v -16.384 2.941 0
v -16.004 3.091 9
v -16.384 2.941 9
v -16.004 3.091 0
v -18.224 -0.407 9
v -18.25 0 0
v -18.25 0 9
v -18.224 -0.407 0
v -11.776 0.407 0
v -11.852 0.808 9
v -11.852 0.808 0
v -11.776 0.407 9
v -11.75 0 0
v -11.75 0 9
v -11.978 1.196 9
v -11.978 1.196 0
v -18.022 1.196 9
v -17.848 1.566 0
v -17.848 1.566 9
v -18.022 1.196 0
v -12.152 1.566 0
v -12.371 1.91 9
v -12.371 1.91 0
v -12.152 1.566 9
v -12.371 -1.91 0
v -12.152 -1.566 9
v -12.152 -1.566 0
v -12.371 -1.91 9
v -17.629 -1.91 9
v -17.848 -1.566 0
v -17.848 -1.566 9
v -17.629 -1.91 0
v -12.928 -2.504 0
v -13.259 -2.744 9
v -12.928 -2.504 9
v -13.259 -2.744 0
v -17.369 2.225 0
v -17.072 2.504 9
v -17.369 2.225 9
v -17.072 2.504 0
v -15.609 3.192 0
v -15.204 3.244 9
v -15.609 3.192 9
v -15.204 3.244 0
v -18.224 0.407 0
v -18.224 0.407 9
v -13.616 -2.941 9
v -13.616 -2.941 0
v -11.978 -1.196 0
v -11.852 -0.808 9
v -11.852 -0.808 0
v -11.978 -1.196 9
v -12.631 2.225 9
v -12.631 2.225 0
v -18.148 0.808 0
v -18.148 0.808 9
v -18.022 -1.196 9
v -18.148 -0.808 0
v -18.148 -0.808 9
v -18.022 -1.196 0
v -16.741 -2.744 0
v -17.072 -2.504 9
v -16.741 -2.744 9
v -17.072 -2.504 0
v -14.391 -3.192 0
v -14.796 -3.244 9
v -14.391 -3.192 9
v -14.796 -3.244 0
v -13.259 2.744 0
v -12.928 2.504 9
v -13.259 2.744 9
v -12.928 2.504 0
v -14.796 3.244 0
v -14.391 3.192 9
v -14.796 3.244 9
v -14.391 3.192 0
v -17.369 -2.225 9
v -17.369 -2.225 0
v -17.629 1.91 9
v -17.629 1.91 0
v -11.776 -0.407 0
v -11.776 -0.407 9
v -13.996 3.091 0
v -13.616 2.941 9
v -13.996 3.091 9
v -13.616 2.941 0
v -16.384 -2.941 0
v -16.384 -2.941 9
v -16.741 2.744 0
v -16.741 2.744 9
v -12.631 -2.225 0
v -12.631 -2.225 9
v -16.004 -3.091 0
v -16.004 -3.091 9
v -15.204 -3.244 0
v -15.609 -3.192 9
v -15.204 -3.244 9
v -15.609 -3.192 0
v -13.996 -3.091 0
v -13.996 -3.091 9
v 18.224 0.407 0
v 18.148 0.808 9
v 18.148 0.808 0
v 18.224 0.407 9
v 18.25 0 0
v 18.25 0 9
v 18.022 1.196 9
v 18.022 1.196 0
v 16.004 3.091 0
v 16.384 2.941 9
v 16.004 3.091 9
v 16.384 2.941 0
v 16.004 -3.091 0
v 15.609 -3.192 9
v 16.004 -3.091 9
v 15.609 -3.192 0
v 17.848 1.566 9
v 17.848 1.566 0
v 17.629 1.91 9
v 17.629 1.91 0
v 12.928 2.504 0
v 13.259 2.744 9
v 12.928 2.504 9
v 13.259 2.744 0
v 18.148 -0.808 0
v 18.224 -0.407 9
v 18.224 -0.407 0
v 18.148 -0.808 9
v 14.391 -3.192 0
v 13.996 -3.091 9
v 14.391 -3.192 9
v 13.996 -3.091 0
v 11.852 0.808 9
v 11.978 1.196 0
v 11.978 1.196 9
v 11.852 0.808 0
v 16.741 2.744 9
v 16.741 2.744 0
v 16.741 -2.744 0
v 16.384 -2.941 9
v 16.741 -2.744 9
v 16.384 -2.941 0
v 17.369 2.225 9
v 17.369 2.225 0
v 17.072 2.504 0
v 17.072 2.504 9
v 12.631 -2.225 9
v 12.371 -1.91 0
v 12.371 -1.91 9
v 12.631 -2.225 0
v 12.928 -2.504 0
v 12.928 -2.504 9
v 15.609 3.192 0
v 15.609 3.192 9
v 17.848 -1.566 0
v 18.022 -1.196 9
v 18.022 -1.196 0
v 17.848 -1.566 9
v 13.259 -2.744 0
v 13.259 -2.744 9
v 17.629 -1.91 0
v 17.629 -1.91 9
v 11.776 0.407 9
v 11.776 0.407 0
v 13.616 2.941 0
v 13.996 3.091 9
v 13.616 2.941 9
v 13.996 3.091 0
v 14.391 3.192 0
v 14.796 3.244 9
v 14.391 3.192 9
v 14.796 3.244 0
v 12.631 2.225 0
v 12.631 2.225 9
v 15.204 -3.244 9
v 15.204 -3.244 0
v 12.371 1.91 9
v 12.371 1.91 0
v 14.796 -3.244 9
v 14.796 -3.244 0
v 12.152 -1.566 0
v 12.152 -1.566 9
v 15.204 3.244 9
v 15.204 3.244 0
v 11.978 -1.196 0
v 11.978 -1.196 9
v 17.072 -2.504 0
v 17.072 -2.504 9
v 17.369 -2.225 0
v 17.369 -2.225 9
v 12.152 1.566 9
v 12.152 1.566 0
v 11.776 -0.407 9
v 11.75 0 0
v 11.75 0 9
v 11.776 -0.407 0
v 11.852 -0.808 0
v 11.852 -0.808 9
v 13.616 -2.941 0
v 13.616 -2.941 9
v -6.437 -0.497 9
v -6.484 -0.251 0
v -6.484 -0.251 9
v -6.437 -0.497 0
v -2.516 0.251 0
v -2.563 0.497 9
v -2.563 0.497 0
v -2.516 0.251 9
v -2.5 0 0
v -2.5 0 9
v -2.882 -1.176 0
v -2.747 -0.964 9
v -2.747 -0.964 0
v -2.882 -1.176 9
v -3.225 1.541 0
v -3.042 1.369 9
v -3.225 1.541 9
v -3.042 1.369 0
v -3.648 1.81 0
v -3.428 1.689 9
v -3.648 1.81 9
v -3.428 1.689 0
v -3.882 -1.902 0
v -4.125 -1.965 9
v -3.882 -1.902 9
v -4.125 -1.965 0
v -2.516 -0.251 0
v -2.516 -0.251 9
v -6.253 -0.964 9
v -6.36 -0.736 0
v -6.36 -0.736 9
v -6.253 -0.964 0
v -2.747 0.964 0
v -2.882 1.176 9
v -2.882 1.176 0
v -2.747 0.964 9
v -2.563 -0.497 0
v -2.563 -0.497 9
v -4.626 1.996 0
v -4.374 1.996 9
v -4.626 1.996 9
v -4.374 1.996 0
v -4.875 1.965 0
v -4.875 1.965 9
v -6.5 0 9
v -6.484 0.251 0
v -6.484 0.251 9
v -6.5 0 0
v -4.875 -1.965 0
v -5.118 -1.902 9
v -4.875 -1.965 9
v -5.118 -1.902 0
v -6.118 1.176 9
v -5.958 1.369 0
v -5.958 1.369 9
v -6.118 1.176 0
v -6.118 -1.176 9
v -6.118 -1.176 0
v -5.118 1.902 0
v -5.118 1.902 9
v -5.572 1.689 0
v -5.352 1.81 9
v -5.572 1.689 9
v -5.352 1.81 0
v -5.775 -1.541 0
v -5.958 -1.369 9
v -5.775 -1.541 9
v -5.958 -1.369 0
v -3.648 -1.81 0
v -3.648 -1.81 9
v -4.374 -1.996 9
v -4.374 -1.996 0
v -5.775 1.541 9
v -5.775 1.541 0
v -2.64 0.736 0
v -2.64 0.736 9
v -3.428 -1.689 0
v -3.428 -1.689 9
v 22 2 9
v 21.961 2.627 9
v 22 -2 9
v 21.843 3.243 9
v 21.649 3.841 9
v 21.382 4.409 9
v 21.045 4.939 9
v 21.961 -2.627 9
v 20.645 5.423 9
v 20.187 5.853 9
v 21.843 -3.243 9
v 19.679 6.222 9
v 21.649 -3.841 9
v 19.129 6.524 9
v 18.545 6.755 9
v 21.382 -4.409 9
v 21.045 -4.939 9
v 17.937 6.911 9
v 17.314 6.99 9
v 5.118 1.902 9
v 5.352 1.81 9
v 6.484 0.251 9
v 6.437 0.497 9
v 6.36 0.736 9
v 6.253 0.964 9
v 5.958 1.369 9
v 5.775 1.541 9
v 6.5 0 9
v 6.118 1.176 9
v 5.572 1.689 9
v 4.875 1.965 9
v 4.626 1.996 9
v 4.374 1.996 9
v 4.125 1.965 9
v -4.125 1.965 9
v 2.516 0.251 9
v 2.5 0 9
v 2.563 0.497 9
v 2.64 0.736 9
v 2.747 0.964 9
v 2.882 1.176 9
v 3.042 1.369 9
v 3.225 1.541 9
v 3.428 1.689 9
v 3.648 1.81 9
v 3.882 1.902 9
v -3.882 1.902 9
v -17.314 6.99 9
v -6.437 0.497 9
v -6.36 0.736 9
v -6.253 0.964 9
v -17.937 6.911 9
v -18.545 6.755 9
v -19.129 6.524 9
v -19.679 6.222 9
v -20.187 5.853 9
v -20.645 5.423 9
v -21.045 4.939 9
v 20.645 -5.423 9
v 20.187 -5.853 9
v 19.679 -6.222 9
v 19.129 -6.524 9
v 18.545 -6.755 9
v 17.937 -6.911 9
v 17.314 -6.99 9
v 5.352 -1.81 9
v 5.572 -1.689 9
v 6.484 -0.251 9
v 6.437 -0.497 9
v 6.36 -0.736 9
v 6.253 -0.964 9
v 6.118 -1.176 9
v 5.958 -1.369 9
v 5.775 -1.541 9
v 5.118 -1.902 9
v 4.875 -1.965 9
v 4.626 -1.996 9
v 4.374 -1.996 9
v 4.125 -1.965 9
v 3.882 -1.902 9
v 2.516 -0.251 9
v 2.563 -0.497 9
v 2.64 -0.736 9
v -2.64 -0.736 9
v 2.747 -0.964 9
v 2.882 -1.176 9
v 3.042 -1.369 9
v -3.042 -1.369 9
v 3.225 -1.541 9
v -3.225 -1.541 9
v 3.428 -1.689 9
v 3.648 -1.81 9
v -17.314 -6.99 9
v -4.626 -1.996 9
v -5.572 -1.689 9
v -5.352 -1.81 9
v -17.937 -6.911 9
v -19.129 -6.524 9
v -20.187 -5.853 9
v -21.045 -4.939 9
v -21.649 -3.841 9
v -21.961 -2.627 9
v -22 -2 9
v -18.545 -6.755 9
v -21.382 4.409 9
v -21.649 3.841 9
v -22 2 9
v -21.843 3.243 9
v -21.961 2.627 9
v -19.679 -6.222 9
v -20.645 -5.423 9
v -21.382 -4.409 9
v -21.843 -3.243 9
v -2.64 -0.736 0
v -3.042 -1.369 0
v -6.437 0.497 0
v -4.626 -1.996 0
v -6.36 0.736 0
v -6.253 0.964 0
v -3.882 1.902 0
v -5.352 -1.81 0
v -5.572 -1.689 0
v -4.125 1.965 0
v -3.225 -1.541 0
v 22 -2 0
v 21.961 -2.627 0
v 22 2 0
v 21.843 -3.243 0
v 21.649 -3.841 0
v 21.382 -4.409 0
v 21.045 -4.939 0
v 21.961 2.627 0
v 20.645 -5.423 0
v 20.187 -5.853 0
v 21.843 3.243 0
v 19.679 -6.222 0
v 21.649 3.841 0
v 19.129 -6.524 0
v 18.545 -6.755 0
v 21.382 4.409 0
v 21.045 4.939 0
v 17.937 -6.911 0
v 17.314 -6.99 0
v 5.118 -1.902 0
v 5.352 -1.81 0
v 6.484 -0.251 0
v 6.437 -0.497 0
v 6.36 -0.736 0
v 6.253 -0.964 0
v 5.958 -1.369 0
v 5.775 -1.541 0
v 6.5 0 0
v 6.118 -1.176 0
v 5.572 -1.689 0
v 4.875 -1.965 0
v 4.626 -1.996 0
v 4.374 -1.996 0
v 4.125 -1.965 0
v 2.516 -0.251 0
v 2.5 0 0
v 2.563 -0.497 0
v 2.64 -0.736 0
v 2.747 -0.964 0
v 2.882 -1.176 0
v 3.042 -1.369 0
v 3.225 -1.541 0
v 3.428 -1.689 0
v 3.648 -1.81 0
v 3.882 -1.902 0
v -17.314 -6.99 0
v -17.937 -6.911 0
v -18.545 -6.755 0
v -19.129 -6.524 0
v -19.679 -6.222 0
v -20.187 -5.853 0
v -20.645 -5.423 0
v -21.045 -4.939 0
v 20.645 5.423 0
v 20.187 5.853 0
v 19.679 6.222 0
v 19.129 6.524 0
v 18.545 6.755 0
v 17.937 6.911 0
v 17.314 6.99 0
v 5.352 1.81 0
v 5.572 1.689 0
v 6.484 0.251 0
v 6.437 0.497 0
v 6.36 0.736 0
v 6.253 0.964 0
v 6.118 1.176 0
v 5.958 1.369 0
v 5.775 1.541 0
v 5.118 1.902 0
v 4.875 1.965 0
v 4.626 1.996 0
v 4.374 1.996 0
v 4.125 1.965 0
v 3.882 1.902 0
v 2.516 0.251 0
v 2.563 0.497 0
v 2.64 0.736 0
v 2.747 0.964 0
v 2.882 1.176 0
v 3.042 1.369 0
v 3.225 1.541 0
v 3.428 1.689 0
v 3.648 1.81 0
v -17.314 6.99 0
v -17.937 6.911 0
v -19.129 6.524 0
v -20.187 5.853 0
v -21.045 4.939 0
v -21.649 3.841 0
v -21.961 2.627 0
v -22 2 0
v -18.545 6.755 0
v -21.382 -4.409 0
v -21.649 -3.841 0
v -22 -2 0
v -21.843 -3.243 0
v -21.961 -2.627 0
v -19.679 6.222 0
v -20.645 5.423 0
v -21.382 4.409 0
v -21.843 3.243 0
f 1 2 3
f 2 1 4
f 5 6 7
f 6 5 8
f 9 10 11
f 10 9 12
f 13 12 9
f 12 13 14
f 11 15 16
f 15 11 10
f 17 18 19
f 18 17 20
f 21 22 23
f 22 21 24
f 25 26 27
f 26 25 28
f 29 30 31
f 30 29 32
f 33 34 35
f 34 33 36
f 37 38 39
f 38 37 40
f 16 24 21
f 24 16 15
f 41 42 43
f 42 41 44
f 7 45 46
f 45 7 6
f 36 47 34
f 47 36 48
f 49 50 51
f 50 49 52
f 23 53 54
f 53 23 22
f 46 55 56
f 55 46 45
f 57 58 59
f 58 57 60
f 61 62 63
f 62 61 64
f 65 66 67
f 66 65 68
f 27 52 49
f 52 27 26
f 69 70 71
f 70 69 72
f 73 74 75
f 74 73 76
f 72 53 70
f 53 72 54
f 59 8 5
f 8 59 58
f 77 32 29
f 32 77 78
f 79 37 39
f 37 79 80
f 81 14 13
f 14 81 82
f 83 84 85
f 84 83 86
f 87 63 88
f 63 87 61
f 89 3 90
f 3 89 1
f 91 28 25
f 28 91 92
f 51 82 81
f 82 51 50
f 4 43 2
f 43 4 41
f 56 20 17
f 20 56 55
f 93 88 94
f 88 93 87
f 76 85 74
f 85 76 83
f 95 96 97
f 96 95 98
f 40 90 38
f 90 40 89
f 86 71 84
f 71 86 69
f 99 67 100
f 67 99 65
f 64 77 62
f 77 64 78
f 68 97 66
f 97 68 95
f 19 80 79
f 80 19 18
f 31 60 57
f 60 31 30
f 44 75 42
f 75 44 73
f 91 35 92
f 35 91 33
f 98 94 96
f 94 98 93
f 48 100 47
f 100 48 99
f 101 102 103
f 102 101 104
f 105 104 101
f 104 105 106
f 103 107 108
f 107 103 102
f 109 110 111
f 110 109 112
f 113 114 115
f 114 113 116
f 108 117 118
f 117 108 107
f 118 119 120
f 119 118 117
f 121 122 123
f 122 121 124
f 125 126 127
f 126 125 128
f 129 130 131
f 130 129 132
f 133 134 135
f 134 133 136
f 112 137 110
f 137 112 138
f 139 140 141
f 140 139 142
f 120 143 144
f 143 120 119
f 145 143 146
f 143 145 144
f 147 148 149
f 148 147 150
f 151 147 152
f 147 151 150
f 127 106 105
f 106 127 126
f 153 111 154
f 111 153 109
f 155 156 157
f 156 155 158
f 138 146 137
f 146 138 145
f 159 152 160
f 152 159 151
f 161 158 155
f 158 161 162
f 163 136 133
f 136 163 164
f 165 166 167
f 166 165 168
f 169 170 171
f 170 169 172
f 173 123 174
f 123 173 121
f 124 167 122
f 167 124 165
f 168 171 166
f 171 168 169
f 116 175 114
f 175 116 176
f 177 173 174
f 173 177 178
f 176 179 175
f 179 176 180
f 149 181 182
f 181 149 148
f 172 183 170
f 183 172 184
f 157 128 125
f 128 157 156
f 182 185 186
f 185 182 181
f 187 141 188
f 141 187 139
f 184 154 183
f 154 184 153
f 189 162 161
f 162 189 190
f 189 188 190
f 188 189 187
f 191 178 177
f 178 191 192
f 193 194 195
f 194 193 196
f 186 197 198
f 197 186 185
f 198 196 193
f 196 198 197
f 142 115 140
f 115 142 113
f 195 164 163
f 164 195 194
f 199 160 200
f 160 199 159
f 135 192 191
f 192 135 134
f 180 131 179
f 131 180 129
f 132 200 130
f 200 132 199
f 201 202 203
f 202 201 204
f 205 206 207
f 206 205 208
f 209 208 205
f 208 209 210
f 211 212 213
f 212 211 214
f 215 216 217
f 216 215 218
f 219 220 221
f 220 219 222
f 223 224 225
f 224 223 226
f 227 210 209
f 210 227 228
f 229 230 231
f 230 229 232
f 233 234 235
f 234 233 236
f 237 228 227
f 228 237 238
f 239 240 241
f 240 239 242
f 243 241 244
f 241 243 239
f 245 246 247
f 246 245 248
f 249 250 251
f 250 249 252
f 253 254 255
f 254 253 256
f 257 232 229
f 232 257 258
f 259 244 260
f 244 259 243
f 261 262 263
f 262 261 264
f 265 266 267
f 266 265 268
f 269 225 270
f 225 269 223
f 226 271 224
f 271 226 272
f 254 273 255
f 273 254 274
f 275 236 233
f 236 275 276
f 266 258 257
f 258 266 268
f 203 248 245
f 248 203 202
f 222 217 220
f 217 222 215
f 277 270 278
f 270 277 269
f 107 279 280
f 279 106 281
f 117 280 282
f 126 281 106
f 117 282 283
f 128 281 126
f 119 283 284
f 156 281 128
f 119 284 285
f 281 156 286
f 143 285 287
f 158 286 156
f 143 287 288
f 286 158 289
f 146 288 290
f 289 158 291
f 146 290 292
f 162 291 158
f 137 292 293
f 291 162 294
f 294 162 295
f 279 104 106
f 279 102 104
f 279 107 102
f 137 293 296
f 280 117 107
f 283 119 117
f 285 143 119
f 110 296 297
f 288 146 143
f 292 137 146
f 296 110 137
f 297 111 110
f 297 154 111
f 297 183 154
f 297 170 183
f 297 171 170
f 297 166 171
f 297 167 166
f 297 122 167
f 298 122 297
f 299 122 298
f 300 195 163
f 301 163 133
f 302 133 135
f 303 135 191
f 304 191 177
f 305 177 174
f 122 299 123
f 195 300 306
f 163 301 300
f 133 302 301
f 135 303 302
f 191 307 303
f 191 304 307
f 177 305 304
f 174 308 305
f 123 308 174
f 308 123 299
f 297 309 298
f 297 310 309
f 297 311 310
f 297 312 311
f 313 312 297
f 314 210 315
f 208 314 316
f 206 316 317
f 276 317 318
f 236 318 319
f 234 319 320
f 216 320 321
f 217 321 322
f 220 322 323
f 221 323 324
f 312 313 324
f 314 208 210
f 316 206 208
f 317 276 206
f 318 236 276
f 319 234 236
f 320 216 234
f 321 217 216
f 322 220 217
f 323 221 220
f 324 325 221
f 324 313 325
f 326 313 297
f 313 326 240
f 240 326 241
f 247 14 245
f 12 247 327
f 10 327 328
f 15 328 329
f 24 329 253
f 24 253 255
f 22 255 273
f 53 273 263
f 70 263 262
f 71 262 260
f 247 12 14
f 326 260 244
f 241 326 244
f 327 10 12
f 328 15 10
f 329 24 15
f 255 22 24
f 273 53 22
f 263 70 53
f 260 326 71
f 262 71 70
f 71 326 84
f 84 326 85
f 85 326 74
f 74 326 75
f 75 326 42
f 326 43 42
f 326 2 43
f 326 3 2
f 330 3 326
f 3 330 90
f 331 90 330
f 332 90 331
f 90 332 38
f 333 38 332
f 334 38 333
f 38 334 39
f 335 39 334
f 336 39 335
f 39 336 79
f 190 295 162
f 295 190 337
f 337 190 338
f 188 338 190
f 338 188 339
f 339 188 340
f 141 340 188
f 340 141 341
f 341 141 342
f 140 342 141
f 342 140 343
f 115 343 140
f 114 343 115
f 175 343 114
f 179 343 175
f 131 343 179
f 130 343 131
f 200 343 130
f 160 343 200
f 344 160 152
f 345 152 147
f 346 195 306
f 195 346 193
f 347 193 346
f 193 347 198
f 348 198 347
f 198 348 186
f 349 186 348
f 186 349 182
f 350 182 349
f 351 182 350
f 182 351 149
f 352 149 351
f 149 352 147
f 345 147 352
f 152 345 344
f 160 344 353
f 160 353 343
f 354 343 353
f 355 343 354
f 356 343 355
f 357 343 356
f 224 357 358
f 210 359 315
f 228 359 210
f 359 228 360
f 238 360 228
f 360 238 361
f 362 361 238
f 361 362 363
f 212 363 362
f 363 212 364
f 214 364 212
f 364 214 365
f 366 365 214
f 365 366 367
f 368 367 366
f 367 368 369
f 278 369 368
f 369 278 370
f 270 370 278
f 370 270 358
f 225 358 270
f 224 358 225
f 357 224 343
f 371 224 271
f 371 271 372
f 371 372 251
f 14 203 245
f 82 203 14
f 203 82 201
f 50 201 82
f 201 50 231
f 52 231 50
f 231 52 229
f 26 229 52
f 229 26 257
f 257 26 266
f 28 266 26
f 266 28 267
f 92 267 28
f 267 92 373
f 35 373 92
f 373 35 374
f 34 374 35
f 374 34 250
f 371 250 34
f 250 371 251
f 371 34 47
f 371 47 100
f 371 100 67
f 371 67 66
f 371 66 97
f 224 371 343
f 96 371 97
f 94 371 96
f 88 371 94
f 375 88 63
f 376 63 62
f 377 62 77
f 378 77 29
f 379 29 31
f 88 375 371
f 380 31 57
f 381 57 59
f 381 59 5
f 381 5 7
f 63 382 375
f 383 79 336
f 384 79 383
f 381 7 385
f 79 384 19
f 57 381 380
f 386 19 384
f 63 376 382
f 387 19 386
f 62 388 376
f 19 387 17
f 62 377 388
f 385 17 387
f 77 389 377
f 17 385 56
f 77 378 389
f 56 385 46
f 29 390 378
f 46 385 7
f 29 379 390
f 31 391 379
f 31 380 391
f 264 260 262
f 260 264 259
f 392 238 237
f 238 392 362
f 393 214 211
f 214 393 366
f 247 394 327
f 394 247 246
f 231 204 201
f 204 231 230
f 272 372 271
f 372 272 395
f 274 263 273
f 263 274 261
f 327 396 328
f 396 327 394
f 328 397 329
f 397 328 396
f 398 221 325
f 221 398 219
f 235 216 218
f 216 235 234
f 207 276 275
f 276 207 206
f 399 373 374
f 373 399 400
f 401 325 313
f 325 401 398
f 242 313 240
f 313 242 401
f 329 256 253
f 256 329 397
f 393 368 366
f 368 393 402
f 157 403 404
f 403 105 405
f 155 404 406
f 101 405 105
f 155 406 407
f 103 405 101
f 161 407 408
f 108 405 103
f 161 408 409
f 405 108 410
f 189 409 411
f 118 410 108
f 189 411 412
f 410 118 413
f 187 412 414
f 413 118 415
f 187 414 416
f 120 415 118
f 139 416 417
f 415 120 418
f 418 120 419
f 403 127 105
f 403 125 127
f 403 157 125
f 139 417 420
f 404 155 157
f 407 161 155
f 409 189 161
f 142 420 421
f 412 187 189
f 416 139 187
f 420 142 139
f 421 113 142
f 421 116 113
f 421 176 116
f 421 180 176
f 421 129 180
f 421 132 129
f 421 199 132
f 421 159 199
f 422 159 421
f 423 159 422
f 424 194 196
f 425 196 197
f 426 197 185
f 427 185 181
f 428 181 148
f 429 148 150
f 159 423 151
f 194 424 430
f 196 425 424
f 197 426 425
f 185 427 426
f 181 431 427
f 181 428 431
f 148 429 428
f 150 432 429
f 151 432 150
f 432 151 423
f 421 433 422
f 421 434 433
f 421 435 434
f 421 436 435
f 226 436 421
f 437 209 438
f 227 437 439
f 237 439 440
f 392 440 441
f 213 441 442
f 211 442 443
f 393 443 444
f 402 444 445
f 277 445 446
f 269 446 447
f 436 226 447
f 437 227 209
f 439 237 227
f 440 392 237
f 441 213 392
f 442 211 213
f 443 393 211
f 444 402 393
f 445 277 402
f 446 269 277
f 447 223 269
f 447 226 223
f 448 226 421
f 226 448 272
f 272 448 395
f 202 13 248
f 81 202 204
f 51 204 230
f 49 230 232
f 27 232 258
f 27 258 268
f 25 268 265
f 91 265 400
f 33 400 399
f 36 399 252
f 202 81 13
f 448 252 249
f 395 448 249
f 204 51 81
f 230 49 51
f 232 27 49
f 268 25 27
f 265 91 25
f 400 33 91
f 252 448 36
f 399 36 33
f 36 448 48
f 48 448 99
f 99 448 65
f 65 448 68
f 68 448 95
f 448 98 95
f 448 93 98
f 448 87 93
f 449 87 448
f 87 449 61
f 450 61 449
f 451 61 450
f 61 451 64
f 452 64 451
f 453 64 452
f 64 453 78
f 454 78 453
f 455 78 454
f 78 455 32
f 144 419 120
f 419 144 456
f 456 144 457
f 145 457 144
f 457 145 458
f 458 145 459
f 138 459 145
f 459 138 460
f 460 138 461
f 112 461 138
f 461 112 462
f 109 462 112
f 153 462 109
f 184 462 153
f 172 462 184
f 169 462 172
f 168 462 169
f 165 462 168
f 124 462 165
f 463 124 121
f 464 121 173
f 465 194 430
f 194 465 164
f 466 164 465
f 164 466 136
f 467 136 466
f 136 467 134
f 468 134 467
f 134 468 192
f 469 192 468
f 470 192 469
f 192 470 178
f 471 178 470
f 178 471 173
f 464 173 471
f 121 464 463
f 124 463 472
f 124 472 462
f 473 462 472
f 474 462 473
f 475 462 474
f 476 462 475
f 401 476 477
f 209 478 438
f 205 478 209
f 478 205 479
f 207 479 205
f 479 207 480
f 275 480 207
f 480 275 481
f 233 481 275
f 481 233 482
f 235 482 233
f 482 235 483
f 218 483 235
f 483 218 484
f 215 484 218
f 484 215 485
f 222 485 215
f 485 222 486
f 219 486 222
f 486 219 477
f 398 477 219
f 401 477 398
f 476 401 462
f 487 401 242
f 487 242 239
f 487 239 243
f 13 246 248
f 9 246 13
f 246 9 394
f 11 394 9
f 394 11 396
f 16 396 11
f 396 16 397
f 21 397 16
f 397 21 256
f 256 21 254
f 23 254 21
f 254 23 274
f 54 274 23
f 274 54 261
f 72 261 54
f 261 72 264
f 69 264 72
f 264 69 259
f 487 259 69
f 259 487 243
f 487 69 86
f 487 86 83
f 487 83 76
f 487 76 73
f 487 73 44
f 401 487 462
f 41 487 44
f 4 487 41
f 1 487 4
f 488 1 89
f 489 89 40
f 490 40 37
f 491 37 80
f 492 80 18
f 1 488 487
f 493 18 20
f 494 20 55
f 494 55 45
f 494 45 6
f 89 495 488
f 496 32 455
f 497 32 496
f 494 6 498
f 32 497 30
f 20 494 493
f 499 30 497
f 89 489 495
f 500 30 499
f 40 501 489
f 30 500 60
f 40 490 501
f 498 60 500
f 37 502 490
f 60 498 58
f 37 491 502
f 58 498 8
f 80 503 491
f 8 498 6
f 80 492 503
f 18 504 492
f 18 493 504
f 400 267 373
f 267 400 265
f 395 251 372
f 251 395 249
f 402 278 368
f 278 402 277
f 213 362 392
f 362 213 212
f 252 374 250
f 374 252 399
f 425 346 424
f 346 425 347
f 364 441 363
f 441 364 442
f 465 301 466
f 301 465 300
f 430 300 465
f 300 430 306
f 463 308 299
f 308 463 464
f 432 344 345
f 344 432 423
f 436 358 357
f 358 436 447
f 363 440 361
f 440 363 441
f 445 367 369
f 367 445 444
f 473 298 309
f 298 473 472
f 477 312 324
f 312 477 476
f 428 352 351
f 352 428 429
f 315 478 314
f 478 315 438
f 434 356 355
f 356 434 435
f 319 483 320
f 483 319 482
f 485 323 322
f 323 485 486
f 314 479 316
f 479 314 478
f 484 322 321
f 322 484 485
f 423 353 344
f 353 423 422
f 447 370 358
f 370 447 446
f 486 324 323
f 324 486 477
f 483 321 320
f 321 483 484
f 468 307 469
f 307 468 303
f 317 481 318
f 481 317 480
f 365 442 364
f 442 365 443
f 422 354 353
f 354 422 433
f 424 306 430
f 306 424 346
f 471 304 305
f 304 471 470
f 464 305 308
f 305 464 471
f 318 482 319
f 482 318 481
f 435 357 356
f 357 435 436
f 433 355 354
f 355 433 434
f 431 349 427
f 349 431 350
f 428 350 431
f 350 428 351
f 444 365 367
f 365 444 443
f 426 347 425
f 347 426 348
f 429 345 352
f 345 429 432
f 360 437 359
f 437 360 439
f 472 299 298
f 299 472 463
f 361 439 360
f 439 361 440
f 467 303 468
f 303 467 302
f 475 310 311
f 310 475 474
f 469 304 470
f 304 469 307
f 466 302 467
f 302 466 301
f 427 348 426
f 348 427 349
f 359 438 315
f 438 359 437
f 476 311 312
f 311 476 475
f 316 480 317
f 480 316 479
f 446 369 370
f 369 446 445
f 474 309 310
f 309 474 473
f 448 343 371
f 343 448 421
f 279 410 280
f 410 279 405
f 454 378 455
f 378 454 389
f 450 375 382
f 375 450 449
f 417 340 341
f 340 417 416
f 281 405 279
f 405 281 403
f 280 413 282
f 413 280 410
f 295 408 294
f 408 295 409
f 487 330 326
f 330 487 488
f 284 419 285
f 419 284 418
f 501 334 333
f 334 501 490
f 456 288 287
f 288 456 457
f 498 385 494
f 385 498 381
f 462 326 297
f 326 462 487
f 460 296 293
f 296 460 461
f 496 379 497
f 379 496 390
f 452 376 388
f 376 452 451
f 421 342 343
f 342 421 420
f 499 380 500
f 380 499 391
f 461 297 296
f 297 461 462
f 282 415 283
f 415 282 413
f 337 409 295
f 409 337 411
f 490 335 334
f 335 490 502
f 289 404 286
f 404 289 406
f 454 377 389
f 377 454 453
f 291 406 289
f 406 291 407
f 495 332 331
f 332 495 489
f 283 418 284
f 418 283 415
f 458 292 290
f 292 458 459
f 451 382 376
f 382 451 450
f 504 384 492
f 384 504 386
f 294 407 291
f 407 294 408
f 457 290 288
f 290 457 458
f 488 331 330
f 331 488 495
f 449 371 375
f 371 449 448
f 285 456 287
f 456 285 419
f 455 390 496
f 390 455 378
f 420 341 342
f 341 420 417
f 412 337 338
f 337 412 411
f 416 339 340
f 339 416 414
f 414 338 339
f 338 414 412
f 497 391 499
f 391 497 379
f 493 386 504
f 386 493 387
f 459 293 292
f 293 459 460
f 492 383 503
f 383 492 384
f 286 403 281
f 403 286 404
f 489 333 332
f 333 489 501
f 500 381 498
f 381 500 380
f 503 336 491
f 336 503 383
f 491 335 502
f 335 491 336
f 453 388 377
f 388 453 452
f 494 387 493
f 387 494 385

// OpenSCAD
$fn = 50;


difference() {
	union() {
		hull() {
			translate(v = [-17.0000000000, 2.0000000000, 0]) {
				cylinder(h = 9, r = 5);
			}
			translate(v = [17.0000000000, 2.0000000000, 0]) {
				cylinder(h = 9, r = 5);
			}
			translate(v = [-17.0000000000, -2.0000000000, 0]) {
				cylinder(h = 9, r = 5);
			}
			translate(v = [17.0000000000, -2.0000000000, 0]) {
				cylinder(h = 9, r = 5);
			}
		}
	}
	union() {
		#translate(v = [-15.0000000000, 0.0000000000, 0]) {
			cylinder(h = 9, r = 3.2500000000);
		}
		#translate(v = [15.0000000000, 0.0000000000, 0]) {
			cylinder(h = 9, r = 3.2500000000);
		}
		#translate(v = [-15.0000000000, 0.0000000000, -100.0000000000]) {
			cylinder(h = 200, r = 3.2500000000);
		}
		#translate(v = [-15.0000000000, 0.0000000000, -100.0000000000]) {
			cylinder(h = 200, r = 3.2500000000);
		}
		#translate(v = [15.0000000000, 0.0000000000, -100.0000000000]) {
			cylinder(h = 200, r = 3.2500000000);
		}
		#translate(v = [15.0000000000, 0.0000000000, -100.0000000000]) {
			cylinder(h = 200, r = 3.2500000000);
		}
		#translate(v = [-15.0000000000, 0.0000000000, 0]) {
			cylinder(h = 9, r = 1.8000000000);
		}
		#translate(v = [15.0000000000, 0.0000000000, 0]) {
			cylinder(h = 9, r = 1.8000000000);
		}
		#translate(v = [-15.0000000000, 0.0000000000, 0]) {
			cylinder(h = 9, r = 1.8000000000);
		}
		#translate(v = [15.0000000000, 0.0000000000, 0]) {
			cylinder(h = 9, r = 1.8000000000);
		}
		#translate(v = [-15.0000000000, 0.0000000000, 0]) {
			cylinder(h = 9, r = 1.8000000000);
		}
		#translate(v = [15.0000000000, 0.0000000000, 0]) {
			cylinder(h = 9, r = 1.8000000000);
		}
		#translate(v = [-4.5000000000, 0, 0]) {
			cylinder(h = 9, r = 2.0000000000);
		}
		#translate(v = [4.5000000000, 0, 0]) {
			cylinder(h = 9, r = 2.0000000000);
		}
	}
}
